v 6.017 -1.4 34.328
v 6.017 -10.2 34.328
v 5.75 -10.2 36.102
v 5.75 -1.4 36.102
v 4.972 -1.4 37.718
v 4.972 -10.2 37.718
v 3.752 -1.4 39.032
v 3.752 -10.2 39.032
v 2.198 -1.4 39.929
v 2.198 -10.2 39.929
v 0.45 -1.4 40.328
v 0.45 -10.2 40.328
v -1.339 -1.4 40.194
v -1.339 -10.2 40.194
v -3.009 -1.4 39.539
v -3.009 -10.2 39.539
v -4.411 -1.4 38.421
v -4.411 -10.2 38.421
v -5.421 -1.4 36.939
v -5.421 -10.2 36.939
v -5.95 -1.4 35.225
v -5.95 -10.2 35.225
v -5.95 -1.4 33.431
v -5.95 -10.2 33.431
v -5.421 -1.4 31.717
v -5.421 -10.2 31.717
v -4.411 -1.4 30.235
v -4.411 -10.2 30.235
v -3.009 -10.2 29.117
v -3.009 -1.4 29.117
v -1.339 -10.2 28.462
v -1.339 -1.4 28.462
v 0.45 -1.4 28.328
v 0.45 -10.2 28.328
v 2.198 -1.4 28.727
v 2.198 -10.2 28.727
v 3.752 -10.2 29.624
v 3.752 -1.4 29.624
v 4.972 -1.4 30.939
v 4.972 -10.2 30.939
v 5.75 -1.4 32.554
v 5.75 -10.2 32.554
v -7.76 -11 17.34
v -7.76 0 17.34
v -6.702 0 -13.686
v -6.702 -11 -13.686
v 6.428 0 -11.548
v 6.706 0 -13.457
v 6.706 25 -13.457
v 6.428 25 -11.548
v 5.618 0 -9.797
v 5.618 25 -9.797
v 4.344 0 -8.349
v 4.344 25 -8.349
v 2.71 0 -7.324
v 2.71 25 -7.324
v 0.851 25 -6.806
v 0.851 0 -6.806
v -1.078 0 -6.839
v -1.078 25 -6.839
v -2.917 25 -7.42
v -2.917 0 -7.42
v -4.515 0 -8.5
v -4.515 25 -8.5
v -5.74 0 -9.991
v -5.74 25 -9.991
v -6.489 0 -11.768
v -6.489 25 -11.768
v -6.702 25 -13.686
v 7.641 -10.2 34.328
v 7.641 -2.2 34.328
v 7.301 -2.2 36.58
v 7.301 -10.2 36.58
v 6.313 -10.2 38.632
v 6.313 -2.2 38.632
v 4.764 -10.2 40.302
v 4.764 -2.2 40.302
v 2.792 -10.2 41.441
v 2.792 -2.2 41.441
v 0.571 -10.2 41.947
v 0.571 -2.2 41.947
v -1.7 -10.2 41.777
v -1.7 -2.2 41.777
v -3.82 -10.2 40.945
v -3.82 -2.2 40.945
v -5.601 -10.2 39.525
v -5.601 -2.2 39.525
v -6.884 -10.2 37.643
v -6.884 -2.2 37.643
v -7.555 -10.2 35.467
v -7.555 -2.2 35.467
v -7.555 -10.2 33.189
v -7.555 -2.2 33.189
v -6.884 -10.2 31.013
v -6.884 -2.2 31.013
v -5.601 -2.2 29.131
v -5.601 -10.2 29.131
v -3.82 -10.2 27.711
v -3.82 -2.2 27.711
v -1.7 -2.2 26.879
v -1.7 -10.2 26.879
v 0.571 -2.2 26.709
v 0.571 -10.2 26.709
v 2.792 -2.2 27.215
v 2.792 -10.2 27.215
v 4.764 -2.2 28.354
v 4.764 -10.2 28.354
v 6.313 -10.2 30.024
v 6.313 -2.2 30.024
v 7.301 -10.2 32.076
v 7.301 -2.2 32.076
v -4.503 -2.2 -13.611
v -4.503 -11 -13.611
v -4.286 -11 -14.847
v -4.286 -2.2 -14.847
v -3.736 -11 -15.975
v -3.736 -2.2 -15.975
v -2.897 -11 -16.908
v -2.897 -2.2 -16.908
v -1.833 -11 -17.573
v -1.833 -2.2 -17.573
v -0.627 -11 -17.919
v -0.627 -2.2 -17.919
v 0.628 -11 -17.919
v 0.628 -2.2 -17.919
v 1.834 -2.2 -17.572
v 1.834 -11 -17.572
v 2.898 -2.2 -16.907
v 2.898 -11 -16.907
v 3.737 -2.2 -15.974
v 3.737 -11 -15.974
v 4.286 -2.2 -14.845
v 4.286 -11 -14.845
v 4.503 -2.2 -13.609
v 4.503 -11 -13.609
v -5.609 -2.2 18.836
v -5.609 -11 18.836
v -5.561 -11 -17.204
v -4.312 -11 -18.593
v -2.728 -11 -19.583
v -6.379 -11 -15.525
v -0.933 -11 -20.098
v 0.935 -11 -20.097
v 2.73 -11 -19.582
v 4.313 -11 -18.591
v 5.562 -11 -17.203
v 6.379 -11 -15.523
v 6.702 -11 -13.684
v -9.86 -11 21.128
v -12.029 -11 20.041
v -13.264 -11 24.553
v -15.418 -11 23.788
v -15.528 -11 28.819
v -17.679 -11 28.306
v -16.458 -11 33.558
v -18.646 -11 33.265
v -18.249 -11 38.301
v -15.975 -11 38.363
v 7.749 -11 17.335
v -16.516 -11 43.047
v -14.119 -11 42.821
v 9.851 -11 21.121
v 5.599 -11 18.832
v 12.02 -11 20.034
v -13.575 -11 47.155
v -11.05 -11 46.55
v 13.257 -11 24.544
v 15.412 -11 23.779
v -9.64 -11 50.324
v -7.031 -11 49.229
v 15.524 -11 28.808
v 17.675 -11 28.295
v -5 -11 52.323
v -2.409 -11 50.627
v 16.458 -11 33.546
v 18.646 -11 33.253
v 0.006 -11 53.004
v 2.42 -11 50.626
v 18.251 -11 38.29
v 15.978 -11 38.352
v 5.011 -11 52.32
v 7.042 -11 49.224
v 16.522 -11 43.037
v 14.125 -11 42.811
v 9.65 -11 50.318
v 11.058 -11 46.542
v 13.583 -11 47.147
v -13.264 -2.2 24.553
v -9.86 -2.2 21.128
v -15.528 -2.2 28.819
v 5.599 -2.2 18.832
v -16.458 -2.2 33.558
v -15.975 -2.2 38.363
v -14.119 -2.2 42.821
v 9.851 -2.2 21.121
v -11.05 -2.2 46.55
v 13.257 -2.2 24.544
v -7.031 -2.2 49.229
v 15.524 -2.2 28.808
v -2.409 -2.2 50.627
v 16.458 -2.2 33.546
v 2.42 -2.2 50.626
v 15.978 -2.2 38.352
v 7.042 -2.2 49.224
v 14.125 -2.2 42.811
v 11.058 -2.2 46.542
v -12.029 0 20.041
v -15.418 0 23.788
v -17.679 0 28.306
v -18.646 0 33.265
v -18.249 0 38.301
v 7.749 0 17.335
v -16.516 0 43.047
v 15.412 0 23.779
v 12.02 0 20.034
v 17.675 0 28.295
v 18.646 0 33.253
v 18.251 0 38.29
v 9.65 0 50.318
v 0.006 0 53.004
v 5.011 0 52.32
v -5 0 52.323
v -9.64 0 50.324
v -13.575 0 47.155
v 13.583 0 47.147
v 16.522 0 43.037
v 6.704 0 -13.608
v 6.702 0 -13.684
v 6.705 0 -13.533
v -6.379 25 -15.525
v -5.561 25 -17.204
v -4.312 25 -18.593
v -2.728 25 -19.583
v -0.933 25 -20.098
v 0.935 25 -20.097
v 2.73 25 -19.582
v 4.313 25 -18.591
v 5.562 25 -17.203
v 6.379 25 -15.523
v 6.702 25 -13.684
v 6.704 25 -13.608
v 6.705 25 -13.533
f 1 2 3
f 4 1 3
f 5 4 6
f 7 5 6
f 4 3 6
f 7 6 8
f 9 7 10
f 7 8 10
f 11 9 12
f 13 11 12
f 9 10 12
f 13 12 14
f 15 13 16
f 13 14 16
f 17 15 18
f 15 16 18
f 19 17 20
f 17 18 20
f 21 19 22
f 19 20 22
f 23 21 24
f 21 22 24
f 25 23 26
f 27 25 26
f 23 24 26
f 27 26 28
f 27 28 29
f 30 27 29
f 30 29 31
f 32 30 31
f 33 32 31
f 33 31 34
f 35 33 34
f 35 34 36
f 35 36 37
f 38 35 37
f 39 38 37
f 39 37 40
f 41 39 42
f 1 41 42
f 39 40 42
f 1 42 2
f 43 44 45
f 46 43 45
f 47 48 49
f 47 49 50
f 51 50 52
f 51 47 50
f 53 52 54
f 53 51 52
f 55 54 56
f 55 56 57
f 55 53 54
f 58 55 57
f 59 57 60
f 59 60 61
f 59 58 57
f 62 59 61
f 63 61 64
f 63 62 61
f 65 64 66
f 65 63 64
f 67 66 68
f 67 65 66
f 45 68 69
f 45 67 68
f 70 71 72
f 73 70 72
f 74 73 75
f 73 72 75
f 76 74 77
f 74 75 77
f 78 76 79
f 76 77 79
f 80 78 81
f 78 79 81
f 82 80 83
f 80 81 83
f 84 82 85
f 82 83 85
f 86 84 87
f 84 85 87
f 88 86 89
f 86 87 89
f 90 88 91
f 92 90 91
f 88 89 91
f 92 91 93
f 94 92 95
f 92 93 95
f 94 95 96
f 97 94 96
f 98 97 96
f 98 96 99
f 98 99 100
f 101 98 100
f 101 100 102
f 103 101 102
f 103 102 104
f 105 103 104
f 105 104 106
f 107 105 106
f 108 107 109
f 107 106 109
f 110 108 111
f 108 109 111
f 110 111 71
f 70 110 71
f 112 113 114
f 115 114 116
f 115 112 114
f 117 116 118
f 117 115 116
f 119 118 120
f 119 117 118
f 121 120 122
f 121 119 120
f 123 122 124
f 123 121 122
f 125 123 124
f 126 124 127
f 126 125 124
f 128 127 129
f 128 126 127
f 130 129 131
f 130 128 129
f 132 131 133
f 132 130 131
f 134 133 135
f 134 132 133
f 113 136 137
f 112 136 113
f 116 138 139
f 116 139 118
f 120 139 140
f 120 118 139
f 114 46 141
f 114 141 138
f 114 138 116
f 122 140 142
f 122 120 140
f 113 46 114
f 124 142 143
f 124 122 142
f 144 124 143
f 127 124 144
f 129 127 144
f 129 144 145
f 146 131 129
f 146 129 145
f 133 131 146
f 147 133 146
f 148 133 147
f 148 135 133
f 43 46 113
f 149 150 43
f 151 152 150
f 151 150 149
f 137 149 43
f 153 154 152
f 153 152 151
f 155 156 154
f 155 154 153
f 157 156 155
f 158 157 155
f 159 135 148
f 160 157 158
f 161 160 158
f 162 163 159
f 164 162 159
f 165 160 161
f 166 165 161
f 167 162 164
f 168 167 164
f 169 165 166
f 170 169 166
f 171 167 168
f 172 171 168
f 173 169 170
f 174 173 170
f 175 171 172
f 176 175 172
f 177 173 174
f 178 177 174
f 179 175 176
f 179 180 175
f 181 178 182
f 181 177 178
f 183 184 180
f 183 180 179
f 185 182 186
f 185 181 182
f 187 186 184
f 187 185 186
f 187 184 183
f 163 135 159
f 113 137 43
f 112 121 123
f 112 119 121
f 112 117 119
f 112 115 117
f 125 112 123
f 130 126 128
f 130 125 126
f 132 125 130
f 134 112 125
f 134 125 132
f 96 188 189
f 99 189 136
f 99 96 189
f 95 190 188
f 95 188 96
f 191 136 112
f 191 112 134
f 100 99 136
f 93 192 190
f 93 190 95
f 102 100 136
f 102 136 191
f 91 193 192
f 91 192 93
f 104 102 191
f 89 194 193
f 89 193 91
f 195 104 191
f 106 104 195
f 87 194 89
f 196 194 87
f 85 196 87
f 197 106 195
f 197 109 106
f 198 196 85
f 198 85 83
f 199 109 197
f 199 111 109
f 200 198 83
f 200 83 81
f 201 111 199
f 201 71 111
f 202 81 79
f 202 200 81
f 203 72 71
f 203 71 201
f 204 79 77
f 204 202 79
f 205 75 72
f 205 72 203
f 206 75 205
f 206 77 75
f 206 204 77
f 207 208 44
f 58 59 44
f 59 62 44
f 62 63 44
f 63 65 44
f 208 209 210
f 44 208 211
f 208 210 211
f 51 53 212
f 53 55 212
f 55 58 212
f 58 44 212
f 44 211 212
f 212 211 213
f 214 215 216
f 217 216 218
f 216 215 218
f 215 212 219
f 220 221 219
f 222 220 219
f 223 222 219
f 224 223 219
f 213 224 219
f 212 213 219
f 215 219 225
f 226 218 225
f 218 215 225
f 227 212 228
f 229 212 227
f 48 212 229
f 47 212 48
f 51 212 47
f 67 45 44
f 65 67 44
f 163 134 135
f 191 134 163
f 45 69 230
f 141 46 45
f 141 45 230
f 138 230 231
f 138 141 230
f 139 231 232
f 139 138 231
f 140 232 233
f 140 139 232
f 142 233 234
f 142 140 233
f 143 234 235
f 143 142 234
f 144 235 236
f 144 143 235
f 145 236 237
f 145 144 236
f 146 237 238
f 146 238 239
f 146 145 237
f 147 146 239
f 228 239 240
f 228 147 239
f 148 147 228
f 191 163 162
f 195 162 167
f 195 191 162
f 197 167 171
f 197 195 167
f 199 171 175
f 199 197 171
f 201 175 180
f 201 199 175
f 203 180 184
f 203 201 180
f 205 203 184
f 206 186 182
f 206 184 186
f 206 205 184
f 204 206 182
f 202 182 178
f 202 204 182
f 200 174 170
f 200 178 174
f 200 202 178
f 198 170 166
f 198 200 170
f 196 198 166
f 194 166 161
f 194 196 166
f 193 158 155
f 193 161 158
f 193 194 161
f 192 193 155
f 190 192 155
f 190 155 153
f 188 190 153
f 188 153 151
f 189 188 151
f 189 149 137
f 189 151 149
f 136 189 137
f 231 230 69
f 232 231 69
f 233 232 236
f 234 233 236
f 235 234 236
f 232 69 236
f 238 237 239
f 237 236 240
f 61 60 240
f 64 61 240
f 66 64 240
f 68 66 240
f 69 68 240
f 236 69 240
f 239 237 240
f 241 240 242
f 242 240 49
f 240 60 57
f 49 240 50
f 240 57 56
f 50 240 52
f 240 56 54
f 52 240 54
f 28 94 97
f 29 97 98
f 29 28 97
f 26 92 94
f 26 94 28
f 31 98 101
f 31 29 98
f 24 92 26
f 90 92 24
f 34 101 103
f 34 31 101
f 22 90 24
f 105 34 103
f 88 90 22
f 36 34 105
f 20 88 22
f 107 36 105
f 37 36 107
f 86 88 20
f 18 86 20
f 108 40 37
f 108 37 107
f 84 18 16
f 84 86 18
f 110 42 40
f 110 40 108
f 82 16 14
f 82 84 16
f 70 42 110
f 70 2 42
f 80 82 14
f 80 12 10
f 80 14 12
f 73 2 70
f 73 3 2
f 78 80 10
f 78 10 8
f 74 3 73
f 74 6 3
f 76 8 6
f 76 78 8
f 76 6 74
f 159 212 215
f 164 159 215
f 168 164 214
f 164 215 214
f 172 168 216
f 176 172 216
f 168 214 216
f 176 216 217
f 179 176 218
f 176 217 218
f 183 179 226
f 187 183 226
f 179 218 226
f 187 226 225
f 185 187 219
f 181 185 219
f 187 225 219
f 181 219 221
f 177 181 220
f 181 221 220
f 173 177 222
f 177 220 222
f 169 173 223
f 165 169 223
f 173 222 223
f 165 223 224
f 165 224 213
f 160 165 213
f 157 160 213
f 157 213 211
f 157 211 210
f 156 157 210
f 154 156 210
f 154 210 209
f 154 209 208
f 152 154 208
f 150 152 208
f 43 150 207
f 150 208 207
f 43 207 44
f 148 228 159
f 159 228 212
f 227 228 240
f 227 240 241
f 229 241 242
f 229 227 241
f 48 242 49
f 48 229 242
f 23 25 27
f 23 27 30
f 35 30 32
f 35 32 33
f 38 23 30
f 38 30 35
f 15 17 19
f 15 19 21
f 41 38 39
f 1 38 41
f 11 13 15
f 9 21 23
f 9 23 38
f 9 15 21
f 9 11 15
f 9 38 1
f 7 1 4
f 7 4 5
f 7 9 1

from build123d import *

# Parameters (mm, degrees)
F0_R     = 5.0192291216
F1_DEPTH = 11
F2_T     = -2.2
F3_R     = 7.6408252188
F4_DEPTH = 8
F5_R     = 6.0170563026
F6_DEPTH = 8.8
F7_DEPTH = 25


# Not quite as in the source:
# - a feature names something its author has since deleted; it is built from what else it names


with BuildPart() as f1:
    # F0 (on Front) → F1 (new body)
    with BuildSketch(Plane.XZ):
        with BuildLine():
            Line((6.7017039213, -13.6836004417), (7.7492278625, 17.3350542571))
            ThreePointArc((7.7492278625, 17.3350542571), (0.0056670875, 53.0044082442), (-7.7595389242, 17.3397601606))
            Line((-7.7595389242, 17.3397601606), (-6.7016295892, -13.6857909072))
            ThreePointArc((-6.7016295892, -13.6857909072), (-0.1142726876, -6.7527281229), (6.7055243621, -13.457278721))
            ThreePointArc((6.7055243621, -13.457278721), (6.7045691839, -13.570455703), (6.7017039213, -13.6836004417))
        make_face()
        with Locations((0, 34.3279652297)):
            Circle(F0_R, mode=Mode.SUBTRACT)
        with BuildLine():
            ThreePointArc((8.3308181793, 34.5567601339), (8.3292111279, 34.0466813329), (8.2964022532, 33.5376562417))
            Line((8.2964022532, 33.5376562417), (8.3308181793, 34.5567601339))
        make_face(mode=Mode.SUBTRACT)
        with BuildLine():
            ThreePointArc((-6.7016295892, -13.6857909072), (0.0010958632, -20.1628029936), (6.7017039213, -13.6836004417))
            ThreePointArc((6.7017039213, -13.6836004417), (6.7045691839, -13.570455703), (6.7055243621, -13.457278721))
            ThreePointArc((6.7055243621, -13.457278721), (-0.1142726876, -6.7527281229), (-6.7016295892, -13.6857909072))
        make_face()
        with BuildLine():
            Line((8.3308181793, 34.5567601339), (8.2964022532, 33.5376562417))
            ThreePointArc((8.2964022532, 33.5376562417), (8.3292111279, 34.0466813329), (8.3308181793, 34.5567601339))
        make_face()
        with Locations((0, 34.3279652297)):
            Circle(F0_R)
    extrude(amount=F1_DEPTH)

    # F2
    f2_openings = [f1.faces().sort_by_distance(p)[0] for p in [
        (-0.000731, -11, 23.334865),
    ]]
    offset(amount=F2_T, openings=f2_openings, kind=Kind.INTERSECTION)

    # F3 (on face) → F4 (join)
    with BuildSketch(Plane.XZ.offset(2.2)):
        with Locations((0, 34.3279652297)):
            Circle(F3_R)
    extrude(amount=F4_DEPTH)

    # F5 (on face) → F6 (cut)
    with BuildSketch(Plane.XZ.offset(10.2)):
        with Locations((0, 34.328058362)):
            Circle(F5_R)
    extrude(amount=-F6_DEPTH, mode=Mode.SUBTRACT)

    # F0 (on Front) → F7 (join)
    with BuildSketch(Plane.XZ):
        with BuildLine():
            ThreePointArc((-6.7016295892, -13.6857909072), (0.0010958632, -20.1628029936), (6.7017039213, -13.6836004417))
            ThreePointArc((6.7017039213, -13.6836004417), (6.7045691839, -13.570455703), (6.7055243621, -13.457278721))
            ThreePointArc((6.7055243621, -13.457278721), (-0.1142726876, -6.7527281229), (-6.7016295892, -13.6857909072))
        make_face()
    extrude(amount=-F7_DEPTH)


solid = f1.part
